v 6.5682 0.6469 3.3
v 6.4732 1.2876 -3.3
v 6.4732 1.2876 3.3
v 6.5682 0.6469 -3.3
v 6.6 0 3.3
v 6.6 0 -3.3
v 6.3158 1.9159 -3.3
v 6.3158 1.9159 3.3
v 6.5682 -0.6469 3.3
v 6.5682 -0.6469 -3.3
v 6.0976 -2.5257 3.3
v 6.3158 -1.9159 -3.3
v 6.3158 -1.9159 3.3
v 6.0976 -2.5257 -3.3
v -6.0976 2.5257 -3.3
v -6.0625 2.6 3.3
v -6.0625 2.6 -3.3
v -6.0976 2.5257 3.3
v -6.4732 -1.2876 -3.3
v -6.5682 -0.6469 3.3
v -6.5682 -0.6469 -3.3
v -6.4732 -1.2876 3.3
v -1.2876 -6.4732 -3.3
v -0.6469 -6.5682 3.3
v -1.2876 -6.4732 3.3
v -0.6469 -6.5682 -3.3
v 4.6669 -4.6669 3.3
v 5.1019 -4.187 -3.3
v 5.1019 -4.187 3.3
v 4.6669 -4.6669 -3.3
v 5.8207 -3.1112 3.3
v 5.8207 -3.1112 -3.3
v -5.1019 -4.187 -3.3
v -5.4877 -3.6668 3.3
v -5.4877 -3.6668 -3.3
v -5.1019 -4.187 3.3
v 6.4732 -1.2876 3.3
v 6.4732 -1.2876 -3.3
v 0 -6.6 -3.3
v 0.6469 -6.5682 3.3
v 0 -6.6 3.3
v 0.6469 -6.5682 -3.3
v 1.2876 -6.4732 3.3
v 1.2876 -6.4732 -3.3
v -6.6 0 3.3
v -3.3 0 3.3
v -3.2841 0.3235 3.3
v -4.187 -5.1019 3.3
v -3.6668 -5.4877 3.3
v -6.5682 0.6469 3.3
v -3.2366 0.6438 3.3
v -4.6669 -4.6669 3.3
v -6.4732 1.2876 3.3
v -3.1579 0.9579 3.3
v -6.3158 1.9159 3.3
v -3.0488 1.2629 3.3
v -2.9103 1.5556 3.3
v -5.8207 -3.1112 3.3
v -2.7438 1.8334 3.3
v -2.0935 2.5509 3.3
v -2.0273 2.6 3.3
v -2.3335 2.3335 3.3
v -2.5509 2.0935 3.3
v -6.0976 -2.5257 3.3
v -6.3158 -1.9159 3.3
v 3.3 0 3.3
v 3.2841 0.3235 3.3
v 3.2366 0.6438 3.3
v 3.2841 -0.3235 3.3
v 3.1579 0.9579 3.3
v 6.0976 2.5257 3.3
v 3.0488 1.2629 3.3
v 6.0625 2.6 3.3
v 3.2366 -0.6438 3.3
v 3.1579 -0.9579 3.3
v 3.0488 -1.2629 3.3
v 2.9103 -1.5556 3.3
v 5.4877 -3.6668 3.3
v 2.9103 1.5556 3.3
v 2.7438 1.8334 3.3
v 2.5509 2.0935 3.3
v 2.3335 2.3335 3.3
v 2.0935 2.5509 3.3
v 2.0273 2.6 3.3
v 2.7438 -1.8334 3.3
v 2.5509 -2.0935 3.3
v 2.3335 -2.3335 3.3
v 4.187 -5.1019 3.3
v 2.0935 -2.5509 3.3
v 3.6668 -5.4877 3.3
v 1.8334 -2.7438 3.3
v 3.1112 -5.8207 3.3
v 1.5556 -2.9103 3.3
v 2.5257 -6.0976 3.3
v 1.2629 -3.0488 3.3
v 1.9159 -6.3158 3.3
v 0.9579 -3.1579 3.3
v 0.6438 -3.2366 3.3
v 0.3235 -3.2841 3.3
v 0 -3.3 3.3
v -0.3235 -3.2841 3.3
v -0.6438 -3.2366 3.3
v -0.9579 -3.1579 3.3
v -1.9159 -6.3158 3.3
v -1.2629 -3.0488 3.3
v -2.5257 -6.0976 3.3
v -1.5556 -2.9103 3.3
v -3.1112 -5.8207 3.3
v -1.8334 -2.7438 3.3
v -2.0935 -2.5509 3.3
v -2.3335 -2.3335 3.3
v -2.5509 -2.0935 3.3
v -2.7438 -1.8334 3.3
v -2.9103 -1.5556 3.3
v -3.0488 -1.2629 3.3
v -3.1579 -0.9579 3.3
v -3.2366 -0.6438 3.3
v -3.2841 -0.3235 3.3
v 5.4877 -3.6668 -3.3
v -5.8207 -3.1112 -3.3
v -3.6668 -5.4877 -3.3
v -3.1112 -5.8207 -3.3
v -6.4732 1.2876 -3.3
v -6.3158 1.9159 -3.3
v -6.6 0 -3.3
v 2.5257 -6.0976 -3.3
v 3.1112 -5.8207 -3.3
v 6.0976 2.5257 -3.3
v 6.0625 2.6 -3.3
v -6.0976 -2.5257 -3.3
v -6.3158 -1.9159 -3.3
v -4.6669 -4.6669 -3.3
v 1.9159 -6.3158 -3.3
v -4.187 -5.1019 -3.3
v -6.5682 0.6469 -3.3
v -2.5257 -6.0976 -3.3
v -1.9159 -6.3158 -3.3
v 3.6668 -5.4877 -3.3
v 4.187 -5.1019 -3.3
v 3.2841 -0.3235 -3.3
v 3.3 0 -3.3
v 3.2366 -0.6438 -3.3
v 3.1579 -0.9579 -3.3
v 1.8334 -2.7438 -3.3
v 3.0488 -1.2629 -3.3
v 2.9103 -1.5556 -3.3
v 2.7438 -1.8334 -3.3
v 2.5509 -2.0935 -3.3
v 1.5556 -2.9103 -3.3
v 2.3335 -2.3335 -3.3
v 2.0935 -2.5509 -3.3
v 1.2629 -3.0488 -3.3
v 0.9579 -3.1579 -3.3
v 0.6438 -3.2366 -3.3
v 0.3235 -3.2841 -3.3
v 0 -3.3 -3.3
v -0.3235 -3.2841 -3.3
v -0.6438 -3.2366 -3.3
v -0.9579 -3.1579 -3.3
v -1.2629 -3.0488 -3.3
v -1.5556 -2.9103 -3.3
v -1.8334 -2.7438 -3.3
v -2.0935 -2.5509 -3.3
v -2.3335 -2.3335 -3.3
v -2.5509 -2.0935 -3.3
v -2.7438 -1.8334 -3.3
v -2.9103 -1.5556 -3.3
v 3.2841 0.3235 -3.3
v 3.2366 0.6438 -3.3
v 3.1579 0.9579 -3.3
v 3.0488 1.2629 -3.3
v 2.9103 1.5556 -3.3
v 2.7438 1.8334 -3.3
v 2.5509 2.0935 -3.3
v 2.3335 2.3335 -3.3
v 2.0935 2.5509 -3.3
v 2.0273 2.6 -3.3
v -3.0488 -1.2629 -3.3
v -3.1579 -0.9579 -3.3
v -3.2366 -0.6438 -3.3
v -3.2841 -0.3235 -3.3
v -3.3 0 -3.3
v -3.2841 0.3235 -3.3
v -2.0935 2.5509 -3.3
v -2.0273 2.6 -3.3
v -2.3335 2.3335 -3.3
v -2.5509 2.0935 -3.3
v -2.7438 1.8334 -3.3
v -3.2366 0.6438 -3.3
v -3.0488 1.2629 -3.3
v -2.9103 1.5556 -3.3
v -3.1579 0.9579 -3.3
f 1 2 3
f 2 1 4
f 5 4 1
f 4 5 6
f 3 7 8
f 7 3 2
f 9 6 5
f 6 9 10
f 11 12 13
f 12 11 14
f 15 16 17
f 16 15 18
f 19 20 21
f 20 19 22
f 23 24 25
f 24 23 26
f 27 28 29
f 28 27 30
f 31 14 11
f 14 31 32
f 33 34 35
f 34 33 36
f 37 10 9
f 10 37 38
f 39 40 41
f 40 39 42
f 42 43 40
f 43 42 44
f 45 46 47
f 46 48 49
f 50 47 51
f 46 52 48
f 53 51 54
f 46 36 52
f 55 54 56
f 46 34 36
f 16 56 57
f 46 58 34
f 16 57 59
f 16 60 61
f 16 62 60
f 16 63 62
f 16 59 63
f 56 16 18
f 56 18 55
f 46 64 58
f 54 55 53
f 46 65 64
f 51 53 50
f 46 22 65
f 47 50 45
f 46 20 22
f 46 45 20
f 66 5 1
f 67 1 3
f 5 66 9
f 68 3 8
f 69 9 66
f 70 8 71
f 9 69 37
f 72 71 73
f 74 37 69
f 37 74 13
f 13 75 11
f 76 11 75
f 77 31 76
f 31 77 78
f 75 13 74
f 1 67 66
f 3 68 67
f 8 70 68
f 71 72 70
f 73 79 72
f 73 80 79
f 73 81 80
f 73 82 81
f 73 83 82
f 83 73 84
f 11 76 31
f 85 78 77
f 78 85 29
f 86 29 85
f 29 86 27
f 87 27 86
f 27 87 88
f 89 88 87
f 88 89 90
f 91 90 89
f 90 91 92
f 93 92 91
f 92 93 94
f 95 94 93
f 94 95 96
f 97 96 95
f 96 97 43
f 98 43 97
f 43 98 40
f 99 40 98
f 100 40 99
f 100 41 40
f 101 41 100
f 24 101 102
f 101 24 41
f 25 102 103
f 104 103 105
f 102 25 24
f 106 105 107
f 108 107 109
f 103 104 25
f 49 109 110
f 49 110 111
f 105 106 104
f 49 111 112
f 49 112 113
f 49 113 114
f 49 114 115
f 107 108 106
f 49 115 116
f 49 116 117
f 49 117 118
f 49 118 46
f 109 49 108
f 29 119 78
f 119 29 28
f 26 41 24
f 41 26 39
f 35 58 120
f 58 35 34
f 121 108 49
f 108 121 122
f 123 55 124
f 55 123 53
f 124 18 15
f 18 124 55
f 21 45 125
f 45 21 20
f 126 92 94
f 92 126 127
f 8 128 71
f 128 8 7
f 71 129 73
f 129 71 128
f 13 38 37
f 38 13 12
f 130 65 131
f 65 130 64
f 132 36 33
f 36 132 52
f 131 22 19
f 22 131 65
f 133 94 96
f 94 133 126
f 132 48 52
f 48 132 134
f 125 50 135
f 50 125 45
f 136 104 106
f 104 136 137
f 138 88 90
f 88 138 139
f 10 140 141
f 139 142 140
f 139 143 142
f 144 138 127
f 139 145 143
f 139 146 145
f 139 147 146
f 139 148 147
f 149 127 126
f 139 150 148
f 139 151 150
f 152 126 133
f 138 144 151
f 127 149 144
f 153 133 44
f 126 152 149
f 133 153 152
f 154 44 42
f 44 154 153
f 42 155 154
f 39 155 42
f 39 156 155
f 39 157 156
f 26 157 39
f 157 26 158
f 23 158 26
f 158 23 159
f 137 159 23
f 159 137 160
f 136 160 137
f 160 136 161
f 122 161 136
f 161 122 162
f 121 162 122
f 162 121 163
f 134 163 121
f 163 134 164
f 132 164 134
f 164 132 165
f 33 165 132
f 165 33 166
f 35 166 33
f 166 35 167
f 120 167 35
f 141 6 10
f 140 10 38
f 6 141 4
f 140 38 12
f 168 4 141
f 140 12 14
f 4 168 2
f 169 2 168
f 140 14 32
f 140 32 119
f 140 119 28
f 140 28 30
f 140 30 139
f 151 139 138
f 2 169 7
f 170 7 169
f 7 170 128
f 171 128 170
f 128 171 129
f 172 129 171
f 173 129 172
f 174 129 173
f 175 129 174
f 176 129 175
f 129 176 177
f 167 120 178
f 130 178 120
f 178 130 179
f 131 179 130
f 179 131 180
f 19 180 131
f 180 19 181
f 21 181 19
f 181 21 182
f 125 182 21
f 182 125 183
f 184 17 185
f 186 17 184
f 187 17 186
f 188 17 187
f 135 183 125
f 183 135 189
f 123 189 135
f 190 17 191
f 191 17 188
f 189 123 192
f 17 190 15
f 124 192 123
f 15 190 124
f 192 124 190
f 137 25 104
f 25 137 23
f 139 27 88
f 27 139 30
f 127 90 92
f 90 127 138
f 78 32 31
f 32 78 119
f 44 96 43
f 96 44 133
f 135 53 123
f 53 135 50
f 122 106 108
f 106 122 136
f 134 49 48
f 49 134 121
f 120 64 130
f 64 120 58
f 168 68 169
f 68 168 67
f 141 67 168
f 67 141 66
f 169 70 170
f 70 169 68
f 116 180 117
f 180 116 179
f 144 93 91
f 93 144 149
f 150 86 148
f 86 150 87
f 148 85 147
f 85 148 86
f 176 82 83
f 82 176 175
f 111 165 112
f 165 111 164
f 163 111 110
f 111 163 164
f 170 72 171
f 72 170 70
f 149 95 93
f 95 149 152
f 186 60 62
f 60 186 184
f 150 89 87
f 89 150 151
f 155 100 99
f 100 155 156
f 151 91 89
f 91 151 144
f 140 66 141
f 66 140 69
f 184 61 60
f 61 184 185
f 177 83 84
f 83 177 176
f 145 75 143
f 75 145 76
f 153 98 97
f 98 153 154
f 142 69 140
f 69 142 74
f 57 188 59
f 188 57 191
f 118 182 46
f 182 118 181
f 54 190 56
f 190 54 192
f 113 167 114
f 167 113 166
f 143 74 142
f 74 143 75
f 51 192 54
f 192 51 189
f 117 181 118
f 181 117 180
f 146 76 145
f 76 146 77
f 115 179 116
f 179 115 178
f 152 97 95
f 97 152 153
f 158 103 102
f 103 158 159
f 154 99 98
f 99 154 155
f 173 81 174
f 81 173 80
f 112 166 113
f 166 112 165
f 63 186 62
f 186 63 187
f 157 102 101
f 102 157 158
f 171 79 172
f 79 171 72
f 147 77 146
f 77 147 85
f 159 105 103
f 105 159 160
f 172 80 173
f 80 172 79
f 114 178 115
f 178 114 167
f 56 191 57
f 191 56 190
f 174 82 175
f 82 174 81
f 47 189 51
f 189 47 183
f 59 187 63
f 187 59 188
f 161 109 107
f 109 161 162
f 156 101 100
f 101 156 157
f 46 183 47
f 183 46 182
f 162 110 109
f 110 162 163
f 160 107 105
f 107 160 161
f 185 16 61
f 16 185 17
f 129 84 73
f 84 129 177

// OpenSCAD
// COBRA Vertebra - T6 V12
// Height: 6.6000000000000005mm, OD: 13.200000000000001mm

$fn = 64;

difference() {
    // Outer cylinder
    cylinder(h=6.6000000000000005, d=13.200000000000001, center=true);
    
    // Inner channel
    cylinder(h=8.600000000000001, d=6.6000000000000005, center=true);

    // Solar panel cavity
    translate([0, 4.6000000000000005, 0])
    cube([50, 4, 30], center=true);

    // Pivot holes
    translate([0, 6.6000000000000005, 0.30000000000000027])
    rotate([90, 0, 0])
    cylinder(h=5.300000000000001, d=4, center=true);
    
    translate([0, 6.6000000000000005, -0.30000000000000027])
    rotate([90, 0, 0])
    cylinder(h=5.300000000000001, d=4, center=true);
}
